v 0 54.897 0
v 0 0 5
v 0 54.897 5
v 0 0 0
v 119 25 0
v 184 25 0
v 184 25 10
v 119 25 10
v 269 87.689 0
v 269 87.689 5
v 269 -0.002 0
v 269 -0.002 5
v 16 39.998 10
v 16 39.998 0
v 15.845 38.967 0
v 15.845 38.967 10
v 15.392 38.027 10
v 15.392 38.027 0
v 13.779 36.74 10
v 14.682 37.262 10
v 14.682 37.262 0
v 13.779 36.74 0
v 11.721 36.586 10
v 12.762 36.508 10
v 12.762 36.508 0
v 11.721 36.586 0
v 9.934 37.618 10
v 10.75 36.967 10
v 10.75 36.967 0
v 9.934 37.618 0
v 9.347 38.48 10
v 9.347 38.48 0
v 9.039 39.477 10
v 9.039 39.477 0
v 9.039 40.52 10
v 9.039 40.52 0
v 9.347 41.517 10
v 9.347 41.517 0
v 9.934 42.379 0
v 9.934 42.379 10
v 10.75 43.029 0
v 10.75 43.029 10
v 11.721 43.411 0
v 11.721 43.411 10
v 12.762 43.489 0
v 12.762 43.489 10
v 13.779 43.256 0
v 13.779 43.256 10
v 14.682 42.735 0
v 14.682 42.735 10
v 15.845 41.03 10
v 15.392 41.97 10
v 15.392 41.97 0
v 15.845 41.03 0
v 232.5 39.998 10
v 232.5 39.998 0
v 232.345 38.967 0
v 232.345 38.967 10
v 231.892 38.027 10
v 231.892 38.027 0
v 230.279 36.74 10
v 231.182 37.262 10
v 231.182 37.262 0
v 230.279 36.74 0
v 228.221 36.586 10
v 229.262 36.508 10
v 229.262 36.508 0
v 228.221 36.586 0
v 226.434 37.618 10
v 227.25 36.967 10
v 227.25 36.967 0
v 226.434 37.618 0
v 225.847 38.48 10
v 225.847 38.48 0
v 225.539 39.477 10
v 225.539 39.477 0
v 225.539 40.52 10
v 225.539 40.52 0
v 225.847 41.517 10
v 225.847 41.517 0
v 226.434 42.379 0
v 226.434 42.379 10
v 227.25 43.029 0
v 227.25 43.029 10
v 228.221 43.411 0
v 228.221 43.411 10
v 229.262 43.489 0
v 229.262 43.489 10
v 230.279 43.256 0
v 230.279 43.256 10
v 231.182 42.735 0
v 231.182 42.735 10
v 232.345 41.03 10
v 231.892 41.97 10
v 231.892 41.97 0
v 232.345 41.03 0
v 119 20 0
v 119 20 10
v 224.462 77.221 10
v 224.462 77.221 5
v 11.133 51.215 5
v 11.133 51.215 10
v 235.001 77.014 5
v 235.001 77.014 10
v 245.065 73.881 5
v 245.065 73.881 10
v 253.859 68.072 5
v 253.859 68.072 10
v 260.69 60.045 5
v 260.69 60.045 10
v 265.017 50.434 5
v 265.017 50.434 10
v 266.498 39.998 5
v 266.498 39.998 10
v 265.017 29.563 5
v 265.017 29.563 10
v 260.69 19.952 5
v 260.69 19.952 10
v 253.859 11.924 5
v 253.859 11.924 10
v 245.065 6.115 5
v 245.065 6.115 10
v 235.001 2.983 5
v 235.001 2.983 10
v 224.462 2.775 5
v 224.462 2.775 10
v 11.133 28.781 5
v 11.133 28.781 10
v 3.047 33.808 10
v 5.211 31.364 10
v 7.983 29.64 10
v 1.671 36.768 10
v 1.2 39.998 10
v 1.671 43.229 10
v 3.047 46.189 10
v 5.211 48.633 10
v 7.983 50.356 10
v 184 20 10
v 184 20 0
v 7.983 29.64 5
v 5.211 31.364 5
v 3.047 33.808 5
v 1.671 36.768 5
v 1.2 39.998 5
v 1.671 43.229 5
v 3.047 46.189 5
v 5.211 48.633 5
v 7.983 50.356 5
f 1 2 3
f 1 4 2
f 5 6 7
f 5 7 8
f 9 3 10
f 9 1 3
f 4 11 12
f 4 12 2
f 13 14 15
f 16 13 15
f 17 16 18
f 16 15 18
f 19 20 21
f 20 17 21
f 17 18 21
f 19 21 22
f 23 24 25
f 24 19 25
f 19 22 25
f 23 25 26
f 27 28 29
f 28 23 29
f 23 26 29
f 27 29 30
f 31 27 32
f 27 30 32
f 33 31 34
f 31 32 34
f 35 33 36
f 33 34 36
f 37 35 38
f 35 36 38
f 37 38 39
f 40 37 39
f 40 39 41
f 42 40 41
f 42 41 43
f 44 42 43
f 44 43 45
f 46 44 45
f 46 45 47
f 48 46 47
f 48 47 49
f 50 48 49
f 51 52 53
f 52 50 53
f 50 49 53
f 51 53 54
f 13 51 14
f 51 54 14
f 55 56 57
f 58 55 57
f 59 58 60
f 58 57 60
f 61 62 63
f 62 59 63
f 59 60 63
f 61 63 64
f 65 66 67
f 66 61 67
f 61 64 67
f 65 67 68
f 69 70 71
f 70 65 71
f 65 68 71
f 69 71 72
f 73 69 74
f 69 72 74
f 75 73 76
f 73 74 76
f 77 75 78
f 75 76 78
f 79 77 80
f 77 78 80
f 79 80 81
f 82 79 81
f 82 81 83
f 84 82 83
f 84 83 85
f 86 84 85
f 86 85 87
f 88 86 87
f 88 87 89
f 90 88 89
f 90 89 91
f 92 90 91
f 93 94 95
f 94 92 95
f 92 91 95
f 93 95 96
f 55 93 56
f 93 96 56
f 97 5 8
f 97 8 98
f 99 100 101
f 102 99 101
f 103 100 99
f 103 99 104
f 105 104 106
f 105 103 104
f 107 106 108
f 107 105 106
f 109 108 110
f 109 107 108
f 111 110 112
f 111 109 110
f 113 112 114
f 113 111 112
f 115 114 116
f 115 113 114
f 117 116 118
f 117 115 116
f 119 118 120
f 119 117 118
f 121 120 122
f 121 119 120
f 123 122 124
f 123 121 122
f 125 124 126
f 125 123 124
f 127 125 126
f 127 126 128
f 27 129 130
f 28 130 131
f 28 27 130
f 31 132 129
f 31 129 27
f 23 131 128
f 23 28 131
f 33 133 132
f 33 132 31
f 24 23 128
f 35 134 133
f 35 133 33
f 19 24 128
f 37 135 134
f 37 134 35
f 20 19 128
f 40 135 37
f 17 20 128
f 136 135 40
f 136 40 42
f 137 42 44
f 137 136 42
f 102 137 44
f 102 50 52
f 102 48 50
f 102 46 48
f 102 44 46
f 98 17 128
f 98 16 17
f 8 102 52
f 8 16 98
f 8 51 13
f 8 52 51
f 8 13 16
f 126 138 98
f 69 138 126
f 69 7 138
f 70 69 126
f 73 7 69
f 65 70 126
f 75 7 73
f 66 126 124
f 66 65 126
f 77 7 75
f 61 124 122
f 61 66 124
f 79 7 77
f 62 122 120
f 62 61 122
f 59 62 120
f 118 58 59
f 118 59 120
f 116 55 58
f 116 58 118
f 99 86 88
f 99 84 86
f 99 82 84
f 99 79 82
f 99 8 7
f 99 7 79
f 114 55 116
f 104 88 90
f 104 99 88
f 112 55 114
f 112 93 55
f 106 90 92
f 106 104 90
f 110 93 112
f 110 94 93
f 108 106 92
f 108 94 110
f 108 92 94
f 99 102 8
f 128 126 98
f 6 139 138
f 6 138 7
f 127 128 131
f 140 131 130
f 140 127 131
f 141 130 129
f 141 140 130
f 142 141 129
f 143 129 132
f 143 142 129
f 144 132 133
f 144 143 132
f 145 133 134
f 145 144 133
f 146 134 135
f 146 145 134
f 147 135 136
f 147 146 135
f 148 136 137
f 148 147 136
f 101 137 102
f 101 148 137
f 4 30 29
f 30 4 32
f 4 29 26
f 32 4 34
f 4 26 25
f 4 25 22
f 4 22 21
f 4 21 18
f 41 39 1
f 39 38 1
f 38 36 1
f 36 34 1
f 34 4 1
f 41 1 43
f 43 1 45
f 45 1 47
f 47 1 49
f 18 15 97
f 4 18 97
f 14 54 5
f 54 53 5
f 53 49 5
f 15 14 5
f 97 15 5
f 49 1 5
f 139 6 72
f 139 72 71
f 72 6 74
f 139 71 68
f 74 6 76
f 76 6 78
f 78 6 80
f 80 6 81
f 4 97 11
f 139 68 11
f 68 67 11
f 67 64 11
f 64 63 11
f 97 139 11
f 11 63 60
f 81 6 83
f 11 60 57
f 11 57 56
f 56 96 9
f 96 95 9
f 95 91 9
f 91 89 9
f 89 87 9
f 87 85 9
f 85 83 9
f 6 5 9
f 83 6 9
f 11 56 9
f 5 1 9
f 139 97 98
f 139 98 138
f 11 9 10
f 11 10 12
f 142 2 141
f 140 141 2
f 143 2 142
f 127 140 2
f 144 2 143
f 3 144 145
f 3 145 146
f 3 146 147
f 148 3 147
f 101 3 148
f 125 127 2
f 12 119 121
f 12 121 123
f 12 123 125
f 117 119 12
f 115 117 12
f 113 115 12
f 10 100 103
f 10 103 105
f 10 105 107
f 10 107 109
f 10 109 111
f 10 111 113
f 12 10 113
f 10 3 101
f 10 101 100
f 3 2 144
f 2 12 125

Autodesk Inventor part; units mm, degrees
ref_plane "YZ Plane" through (0, 0, 0) normal (1, 0, 0) x (0, 1, 0)
ref_plane "XZ Plane" through (0, 0, 0) normal (0, 1, 0) x (-1, 0, 0)
ref_plane "XY Plane" through (0, 0, 0) normal (0, 0, 1) x (1, 0, 0)
sketch "Boceto1" plane through (0, 0, 0) normal (0, 0, 1) x (1, 0, 0)
  circle A0 centre (229, 39.9983) radius 35 construction
  line L0 (269, 87.6892) -> (269, -0.002)
  line L1 (269, -0.002) -> (0, 0)
  line L2 (0, 0) -> (0, 54.8968)
  line L3 (457.9938, -0.0034) -> (457.9938, 80) construction
  line L4 (457.9938, 80) -> (-432.9938, 80) construction
  line L5 (189, -0.0014) -> (189, 79.998) construction
  line L6 (189, 79.998) -> (269, 79.998) construction
  circle A1 centre (229, 39.9983) radius 11.3 construction
  line L7 (119, 54.9966) -> (199, 54.9966) construction
  line L8 (199, 54.9966) -> (199, 25) construction
  line L9 (199, 25) -> (119, 25) construction
  line L10 (119, 25) -> (119, 54.9966) construction
  arc A2 (224.4624, 2.7754) -> (224.4624, 77.2212) centre (229, 39.9983) ccw
  arc A3 (11.1326, 51.2153) -> (11.1326, 28.7814) centre (12.5, 39.9983) ccw
  line L11 (224.4624, 77.2212) -> (11.1326, 51.2153)
  line L12 (224.4624, 2.7754) -> (11.1326, 28.7814)
  line L13 (0, 54.8968) -> (269, 87.6892)
  line L14 (119, 20) -> (184, 20)
  line L15 (119, 25) -> (119, 20)
  line L16 (184, 20) -> (184, 25)
  circle A4 centre (12.5, 39.9983) radius 3.5
  circle A5 centre (229, 39.9983) radius 3.5
  circle A6 centre (229, 39.9983) radius 30 construction
  line L17 (184, 25) -> (119, 25)
  point P0 (457.9938, 39.9983)
  point P1 (12.5, 80)
  point P2 (189, 39.9983)
  point P3 (229, 79.998)
  point P4 (199, 39.9983)
  dimension "d2" = 269
  dimension "d17" = 5
  dimension "d18" = 65
  dimension "d19" = 7
  dimension "d25" = 87.6911
  dimension "d26" = 40
  dimension "d27" = 40
  dimension "d28" = 12.5
  dimension "d29" = 39.9984
  dimension "d30" = 7
  dimension "d31" = 54.8968
extrude "Extrusión1" add sketch "Boceto1" along normal blind 5 contours L0 L1 L2 L13 | L12 A3 L11 A2
extrude "Extrusión2" add sketch "Boceto1" along normal blind 10 contours L12 A3 L11 A2
properties part number "divisores_banda"
